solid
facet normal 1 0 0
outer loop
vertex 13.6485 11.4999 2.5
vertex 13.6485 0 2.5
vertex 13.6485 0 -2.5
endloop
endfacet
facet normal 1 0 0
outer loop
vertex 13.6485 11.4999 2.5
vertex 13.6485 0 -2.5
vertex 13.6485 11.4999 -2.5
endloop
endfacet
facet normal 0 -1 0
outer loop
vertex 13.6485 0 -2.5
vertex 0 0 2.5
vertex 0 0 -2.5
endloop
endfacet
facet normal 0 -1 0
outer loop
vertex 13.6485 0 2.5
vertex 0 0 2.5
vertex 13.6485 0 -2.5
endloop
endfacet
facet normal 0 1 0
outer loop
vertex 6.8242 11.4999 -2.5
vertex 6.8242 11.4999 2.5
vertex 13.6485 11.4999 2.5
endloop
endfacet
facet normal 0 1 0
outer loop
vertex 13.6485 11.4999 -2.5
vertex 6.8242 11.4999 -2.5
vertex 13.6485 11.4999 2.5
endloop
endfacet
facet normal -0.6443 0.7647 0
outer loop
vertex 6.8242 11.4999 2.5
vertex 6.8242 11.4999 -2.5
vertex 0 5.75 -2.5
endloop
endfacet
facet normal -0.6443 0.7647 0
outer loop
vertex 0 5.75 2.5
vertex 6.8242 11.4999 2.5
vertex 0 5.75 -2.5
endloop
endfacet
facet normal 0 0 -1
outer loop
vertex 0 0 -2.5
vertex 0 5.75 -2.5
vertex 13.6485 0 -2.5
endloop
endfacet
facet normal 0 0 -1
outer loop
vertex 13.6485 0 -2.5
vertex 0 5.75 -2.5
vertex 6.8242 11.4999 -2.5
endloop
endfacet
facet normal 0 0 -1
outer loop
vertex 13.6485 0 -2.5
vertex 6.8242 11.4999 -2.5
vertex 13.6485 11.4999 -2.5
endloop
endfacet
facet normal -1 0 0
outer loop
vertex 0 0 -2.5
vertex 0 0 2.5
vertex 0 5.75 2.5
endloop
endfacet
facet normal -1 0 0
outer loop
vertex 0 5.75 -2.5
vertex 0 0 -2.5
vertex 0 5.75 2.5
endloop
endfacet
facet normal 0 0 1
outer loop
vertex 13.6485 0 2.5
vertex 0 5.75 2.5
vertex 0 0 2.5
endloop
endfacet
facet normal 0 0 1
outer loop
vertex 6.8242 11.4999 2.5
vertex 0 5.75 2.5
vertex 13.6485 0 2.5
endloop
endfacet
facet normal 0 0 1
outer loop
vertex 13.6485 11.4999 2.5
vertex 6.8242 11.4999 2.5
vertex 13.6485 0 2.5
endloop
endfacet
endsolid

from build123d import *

# Parameters (mm, degrees)
SKETCH1_W          = 13.648457072
SKETCH1_H          = 11.499915192
EXTRUDE1_DEPTH     = 2.5
CUT_EXTRUDE1_DEPTH = 10


with BuildPart() as part:
    # Sketch1 → Extrude1 (new, symmetric)
    with BuildSketch(Plane.XY):
        with Locations((6.824228536, 5.749957596)):
            Rectangle(SKETCH1_W, SKETCH1_H)
    extrude(amount=EXTRUDE1_DEPTH, both=True)

    # Sketch2 → Cut-Extrude1 (cut)
    with BuildSketch(Plane(origin=(0, 0, -2.5), x_dir=(-1, 0, 0), z_dir=(0, 0, -1))):
        Polygon((-6.824228536, 11.499915192), (0, 5.749957596), (0, 11.499915192), align=None)
    extrude(amount=-CUT_EXTRUDE1_DEPTH, mode=Mode.SUBTRACT)


solid = part.part
